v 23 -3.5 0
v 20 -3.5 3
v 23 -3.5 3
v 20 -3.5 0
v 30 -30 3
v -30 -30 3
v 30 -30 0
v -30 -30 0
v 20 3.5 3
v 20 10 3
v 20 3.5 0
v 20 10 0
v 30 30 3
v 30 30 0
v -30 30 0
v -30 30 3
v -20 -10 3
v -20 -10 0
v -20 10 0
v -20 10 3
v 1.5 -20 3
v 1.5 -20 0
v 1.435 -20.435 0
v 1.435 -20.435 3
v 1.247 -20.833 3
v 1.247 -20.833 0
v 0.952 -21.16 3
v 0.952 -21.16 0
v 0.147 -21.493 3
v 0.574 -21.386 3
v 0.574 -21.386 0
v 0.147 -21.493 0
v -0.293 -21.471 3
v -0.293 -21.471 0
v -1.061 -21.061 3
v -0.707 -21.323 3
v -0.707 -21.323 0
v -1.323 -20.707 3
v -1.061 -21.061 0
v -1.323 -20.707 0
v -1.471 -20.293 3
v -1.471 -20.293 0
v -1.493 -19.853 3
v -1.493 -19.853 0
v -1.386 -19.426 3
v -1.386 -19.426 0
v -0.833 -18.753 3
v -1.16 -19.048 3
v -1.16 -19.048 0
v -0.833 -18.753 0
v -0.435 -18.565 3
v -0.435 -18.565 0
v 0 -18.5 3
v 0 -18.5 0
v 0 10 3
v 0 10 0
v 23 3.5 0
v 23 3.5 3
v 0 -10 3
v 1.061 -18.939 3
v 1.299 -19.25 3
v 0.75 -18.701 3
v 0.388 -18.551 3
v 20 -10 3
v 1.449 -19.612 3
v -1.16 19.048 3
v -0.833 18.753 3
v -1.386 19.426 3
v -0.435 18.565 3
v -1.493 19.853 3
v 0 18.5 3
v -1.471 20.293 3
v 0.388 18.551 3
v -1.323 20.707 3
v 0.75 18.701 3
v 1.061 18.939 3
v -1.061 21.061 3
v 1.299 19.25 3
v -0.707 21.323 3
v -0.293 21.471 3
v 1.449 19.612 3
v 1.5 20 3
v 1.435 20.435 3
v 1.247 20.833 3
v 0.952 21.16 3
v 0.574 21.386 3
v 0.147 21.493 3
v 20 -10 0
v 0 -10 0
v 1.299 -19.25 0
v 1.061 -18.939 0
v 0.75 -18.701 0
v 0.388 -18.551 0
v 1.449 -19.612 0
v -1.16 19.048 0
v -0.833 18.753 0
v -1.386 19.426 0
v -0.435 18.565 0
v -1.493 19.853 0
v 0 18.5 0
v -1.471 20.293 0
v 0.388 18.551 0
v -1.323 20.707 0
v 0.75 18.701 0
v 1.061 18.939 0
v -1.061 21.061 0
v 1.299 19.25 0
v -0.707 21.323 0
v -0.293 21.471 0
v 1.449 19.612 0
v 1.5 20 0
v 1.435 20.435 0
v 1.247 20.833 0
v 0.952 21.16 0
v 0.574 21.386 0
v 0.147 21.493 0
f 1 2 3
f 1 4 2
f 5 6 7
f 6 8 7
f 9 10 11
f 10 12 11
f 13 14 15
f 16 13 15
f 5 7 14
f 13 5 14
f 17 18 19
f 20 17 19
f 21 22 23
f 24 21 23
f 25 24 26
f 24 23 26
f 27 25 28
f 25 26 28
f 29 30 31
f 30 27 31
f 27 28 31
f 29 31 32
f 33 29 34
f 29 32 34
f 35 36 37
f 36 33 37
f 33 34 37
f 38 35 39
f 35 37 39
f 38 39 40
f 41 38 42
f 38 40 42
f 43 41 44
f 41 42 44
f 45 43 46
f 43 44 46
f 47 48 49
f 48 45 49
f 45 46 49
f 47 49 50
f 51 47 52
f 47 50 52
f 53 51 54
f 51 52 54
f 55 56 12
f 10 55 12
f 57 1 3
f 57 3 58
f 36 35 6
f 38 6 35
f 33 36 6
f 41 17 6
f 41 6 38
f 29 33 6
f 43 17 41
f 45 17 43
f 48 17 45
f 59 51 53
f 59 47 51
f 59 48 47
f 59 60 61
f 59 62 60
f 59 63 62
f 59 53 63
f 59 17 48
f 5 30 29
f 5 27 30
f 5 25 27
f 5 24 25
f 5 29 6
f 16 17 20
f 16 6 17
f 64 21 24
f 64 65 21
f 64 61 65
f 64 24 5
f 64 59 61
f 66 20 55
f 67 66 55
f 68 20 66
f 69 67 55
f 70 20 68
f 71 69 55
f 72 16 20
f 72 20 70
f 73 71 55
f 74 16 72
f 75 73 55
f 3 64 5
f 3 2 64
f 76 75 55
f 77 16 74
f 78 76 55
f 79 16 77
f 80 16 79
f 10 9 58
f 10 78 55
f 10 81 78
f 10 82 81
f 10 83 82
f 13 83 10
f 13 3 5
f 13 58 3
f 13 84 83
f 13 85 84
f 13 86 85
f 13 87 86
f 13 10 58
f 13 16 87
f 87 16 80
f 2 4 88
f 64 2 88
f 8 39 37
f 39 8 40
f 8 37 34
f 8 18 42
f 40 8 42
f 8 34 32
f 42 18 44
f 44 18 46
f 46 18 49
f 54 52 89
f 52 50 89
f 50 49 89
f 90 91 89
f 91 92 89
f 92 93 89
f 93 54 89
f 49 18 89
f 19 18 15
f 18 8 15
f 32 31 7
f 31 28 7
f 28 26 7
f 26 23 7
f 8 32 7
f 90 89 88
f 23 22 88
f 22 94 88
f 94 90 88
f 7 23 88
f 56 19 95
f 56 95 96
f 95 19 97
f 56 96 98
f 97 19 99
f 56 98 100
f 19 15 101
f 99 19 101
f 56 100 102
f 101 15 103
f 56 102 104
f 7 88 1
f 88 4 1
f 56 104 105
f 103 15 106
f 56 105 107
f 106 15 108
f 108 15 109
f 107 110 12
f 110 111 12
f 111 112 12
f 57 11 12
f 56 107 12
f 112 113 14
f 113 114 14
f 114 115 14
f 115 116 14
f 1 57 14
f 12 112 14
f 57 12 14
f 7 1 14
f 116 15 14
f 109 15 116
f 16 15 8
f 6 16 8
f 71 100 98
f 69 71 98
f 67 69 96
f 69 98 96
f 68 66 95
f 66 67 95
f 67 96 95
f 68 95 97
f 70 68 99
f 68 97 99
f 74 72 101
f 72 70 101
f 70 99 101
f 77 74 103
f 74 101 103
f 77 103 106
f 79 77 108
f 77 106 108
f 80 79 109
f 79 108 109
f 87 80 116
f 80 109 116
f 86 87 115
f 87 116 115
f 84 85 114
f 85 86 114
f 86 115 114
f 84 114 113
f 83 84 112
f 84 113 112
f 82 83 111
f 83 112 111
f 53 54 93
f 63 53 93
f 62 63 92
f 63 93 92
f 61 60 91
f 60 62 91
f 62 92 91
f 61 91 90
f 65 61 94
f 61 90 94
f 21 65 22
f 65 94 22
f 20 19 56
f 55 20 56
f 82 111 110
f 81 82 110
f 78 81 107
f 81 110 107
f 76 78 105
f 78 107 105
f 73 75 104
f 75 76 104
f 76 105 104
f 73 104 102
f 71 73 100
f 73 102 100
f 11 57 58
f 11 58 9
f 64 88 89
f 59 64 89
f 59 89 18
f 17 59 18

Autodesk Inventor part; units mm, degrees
ref_plane "YZ Plane" through (0, 0, 0) normal (1, 0, 0) x (0, 1, 0)
ref_plane "XZ Plane" through (0, 0, 0) normal (0, 1, 0) x (-1, 0, 0)
ref_plane "XY Plane" through (0, 0, 0) normal (0, 0, 1) x (1, 0, 0)
sketch "Sketch1" plane through (0, 0, 0) normal (0, 0, 1) x (1, 0, 0)
  line L0 (-20, 10) -> (20, 10)
  line L1 (20, -10) -> (-20, -10)
  line L2 (-20, -10) -> (-20, 10)
  line L3 (-20, 10) -> (20, -10) construction
  line L4 (20, 10) -> (-20, -10) construction
  line L5 (-30, -30) -> (30, -30)
  line L6 (30, -30) -> (30, 30)
  line L7 (30, 30) -> (-30, 30)
  line L8 (-30, 30) -> (-30, -30)
  line L9 (-30, -30) -> (30, 30) construction
  line L10 (30, -30) -> (-30, 30) construction
  line L11 (0, 10) -> (0, 20)
  line L12 (0, -10) -> (0, -20)
  circle A0 centre (0, 20) radius 1.5
  circle A1 centre (0, -20) radius 1.5
  line L13 (20, -3.5) -> (23, -3.5)
  line L14 (23, -3.5) -> (23, 3.5)
  line L15 (23, 3.5) -> (20, 3.5)
  line L16 (20, 10) -> (20, 3.5)
  line L17 (20, -3.5) -> (20, -10)
  point P0 (0, 0)
  point P1 (20, 0)
  dimension "d0" = 40
  dimension "d1" = 20
  dimension "d2" = 60
  dimension "d3" = 60
  dimension "d4" = 10
  dimension "d5" = 10
  dimension "d6" = 3
  dimension "d7" = 3
  dimension "d11" = 7
extrude "Extrusion2" add sketch "Sketch1" along normal blind 3
properties part number "Servo Holder BOTTOM"
